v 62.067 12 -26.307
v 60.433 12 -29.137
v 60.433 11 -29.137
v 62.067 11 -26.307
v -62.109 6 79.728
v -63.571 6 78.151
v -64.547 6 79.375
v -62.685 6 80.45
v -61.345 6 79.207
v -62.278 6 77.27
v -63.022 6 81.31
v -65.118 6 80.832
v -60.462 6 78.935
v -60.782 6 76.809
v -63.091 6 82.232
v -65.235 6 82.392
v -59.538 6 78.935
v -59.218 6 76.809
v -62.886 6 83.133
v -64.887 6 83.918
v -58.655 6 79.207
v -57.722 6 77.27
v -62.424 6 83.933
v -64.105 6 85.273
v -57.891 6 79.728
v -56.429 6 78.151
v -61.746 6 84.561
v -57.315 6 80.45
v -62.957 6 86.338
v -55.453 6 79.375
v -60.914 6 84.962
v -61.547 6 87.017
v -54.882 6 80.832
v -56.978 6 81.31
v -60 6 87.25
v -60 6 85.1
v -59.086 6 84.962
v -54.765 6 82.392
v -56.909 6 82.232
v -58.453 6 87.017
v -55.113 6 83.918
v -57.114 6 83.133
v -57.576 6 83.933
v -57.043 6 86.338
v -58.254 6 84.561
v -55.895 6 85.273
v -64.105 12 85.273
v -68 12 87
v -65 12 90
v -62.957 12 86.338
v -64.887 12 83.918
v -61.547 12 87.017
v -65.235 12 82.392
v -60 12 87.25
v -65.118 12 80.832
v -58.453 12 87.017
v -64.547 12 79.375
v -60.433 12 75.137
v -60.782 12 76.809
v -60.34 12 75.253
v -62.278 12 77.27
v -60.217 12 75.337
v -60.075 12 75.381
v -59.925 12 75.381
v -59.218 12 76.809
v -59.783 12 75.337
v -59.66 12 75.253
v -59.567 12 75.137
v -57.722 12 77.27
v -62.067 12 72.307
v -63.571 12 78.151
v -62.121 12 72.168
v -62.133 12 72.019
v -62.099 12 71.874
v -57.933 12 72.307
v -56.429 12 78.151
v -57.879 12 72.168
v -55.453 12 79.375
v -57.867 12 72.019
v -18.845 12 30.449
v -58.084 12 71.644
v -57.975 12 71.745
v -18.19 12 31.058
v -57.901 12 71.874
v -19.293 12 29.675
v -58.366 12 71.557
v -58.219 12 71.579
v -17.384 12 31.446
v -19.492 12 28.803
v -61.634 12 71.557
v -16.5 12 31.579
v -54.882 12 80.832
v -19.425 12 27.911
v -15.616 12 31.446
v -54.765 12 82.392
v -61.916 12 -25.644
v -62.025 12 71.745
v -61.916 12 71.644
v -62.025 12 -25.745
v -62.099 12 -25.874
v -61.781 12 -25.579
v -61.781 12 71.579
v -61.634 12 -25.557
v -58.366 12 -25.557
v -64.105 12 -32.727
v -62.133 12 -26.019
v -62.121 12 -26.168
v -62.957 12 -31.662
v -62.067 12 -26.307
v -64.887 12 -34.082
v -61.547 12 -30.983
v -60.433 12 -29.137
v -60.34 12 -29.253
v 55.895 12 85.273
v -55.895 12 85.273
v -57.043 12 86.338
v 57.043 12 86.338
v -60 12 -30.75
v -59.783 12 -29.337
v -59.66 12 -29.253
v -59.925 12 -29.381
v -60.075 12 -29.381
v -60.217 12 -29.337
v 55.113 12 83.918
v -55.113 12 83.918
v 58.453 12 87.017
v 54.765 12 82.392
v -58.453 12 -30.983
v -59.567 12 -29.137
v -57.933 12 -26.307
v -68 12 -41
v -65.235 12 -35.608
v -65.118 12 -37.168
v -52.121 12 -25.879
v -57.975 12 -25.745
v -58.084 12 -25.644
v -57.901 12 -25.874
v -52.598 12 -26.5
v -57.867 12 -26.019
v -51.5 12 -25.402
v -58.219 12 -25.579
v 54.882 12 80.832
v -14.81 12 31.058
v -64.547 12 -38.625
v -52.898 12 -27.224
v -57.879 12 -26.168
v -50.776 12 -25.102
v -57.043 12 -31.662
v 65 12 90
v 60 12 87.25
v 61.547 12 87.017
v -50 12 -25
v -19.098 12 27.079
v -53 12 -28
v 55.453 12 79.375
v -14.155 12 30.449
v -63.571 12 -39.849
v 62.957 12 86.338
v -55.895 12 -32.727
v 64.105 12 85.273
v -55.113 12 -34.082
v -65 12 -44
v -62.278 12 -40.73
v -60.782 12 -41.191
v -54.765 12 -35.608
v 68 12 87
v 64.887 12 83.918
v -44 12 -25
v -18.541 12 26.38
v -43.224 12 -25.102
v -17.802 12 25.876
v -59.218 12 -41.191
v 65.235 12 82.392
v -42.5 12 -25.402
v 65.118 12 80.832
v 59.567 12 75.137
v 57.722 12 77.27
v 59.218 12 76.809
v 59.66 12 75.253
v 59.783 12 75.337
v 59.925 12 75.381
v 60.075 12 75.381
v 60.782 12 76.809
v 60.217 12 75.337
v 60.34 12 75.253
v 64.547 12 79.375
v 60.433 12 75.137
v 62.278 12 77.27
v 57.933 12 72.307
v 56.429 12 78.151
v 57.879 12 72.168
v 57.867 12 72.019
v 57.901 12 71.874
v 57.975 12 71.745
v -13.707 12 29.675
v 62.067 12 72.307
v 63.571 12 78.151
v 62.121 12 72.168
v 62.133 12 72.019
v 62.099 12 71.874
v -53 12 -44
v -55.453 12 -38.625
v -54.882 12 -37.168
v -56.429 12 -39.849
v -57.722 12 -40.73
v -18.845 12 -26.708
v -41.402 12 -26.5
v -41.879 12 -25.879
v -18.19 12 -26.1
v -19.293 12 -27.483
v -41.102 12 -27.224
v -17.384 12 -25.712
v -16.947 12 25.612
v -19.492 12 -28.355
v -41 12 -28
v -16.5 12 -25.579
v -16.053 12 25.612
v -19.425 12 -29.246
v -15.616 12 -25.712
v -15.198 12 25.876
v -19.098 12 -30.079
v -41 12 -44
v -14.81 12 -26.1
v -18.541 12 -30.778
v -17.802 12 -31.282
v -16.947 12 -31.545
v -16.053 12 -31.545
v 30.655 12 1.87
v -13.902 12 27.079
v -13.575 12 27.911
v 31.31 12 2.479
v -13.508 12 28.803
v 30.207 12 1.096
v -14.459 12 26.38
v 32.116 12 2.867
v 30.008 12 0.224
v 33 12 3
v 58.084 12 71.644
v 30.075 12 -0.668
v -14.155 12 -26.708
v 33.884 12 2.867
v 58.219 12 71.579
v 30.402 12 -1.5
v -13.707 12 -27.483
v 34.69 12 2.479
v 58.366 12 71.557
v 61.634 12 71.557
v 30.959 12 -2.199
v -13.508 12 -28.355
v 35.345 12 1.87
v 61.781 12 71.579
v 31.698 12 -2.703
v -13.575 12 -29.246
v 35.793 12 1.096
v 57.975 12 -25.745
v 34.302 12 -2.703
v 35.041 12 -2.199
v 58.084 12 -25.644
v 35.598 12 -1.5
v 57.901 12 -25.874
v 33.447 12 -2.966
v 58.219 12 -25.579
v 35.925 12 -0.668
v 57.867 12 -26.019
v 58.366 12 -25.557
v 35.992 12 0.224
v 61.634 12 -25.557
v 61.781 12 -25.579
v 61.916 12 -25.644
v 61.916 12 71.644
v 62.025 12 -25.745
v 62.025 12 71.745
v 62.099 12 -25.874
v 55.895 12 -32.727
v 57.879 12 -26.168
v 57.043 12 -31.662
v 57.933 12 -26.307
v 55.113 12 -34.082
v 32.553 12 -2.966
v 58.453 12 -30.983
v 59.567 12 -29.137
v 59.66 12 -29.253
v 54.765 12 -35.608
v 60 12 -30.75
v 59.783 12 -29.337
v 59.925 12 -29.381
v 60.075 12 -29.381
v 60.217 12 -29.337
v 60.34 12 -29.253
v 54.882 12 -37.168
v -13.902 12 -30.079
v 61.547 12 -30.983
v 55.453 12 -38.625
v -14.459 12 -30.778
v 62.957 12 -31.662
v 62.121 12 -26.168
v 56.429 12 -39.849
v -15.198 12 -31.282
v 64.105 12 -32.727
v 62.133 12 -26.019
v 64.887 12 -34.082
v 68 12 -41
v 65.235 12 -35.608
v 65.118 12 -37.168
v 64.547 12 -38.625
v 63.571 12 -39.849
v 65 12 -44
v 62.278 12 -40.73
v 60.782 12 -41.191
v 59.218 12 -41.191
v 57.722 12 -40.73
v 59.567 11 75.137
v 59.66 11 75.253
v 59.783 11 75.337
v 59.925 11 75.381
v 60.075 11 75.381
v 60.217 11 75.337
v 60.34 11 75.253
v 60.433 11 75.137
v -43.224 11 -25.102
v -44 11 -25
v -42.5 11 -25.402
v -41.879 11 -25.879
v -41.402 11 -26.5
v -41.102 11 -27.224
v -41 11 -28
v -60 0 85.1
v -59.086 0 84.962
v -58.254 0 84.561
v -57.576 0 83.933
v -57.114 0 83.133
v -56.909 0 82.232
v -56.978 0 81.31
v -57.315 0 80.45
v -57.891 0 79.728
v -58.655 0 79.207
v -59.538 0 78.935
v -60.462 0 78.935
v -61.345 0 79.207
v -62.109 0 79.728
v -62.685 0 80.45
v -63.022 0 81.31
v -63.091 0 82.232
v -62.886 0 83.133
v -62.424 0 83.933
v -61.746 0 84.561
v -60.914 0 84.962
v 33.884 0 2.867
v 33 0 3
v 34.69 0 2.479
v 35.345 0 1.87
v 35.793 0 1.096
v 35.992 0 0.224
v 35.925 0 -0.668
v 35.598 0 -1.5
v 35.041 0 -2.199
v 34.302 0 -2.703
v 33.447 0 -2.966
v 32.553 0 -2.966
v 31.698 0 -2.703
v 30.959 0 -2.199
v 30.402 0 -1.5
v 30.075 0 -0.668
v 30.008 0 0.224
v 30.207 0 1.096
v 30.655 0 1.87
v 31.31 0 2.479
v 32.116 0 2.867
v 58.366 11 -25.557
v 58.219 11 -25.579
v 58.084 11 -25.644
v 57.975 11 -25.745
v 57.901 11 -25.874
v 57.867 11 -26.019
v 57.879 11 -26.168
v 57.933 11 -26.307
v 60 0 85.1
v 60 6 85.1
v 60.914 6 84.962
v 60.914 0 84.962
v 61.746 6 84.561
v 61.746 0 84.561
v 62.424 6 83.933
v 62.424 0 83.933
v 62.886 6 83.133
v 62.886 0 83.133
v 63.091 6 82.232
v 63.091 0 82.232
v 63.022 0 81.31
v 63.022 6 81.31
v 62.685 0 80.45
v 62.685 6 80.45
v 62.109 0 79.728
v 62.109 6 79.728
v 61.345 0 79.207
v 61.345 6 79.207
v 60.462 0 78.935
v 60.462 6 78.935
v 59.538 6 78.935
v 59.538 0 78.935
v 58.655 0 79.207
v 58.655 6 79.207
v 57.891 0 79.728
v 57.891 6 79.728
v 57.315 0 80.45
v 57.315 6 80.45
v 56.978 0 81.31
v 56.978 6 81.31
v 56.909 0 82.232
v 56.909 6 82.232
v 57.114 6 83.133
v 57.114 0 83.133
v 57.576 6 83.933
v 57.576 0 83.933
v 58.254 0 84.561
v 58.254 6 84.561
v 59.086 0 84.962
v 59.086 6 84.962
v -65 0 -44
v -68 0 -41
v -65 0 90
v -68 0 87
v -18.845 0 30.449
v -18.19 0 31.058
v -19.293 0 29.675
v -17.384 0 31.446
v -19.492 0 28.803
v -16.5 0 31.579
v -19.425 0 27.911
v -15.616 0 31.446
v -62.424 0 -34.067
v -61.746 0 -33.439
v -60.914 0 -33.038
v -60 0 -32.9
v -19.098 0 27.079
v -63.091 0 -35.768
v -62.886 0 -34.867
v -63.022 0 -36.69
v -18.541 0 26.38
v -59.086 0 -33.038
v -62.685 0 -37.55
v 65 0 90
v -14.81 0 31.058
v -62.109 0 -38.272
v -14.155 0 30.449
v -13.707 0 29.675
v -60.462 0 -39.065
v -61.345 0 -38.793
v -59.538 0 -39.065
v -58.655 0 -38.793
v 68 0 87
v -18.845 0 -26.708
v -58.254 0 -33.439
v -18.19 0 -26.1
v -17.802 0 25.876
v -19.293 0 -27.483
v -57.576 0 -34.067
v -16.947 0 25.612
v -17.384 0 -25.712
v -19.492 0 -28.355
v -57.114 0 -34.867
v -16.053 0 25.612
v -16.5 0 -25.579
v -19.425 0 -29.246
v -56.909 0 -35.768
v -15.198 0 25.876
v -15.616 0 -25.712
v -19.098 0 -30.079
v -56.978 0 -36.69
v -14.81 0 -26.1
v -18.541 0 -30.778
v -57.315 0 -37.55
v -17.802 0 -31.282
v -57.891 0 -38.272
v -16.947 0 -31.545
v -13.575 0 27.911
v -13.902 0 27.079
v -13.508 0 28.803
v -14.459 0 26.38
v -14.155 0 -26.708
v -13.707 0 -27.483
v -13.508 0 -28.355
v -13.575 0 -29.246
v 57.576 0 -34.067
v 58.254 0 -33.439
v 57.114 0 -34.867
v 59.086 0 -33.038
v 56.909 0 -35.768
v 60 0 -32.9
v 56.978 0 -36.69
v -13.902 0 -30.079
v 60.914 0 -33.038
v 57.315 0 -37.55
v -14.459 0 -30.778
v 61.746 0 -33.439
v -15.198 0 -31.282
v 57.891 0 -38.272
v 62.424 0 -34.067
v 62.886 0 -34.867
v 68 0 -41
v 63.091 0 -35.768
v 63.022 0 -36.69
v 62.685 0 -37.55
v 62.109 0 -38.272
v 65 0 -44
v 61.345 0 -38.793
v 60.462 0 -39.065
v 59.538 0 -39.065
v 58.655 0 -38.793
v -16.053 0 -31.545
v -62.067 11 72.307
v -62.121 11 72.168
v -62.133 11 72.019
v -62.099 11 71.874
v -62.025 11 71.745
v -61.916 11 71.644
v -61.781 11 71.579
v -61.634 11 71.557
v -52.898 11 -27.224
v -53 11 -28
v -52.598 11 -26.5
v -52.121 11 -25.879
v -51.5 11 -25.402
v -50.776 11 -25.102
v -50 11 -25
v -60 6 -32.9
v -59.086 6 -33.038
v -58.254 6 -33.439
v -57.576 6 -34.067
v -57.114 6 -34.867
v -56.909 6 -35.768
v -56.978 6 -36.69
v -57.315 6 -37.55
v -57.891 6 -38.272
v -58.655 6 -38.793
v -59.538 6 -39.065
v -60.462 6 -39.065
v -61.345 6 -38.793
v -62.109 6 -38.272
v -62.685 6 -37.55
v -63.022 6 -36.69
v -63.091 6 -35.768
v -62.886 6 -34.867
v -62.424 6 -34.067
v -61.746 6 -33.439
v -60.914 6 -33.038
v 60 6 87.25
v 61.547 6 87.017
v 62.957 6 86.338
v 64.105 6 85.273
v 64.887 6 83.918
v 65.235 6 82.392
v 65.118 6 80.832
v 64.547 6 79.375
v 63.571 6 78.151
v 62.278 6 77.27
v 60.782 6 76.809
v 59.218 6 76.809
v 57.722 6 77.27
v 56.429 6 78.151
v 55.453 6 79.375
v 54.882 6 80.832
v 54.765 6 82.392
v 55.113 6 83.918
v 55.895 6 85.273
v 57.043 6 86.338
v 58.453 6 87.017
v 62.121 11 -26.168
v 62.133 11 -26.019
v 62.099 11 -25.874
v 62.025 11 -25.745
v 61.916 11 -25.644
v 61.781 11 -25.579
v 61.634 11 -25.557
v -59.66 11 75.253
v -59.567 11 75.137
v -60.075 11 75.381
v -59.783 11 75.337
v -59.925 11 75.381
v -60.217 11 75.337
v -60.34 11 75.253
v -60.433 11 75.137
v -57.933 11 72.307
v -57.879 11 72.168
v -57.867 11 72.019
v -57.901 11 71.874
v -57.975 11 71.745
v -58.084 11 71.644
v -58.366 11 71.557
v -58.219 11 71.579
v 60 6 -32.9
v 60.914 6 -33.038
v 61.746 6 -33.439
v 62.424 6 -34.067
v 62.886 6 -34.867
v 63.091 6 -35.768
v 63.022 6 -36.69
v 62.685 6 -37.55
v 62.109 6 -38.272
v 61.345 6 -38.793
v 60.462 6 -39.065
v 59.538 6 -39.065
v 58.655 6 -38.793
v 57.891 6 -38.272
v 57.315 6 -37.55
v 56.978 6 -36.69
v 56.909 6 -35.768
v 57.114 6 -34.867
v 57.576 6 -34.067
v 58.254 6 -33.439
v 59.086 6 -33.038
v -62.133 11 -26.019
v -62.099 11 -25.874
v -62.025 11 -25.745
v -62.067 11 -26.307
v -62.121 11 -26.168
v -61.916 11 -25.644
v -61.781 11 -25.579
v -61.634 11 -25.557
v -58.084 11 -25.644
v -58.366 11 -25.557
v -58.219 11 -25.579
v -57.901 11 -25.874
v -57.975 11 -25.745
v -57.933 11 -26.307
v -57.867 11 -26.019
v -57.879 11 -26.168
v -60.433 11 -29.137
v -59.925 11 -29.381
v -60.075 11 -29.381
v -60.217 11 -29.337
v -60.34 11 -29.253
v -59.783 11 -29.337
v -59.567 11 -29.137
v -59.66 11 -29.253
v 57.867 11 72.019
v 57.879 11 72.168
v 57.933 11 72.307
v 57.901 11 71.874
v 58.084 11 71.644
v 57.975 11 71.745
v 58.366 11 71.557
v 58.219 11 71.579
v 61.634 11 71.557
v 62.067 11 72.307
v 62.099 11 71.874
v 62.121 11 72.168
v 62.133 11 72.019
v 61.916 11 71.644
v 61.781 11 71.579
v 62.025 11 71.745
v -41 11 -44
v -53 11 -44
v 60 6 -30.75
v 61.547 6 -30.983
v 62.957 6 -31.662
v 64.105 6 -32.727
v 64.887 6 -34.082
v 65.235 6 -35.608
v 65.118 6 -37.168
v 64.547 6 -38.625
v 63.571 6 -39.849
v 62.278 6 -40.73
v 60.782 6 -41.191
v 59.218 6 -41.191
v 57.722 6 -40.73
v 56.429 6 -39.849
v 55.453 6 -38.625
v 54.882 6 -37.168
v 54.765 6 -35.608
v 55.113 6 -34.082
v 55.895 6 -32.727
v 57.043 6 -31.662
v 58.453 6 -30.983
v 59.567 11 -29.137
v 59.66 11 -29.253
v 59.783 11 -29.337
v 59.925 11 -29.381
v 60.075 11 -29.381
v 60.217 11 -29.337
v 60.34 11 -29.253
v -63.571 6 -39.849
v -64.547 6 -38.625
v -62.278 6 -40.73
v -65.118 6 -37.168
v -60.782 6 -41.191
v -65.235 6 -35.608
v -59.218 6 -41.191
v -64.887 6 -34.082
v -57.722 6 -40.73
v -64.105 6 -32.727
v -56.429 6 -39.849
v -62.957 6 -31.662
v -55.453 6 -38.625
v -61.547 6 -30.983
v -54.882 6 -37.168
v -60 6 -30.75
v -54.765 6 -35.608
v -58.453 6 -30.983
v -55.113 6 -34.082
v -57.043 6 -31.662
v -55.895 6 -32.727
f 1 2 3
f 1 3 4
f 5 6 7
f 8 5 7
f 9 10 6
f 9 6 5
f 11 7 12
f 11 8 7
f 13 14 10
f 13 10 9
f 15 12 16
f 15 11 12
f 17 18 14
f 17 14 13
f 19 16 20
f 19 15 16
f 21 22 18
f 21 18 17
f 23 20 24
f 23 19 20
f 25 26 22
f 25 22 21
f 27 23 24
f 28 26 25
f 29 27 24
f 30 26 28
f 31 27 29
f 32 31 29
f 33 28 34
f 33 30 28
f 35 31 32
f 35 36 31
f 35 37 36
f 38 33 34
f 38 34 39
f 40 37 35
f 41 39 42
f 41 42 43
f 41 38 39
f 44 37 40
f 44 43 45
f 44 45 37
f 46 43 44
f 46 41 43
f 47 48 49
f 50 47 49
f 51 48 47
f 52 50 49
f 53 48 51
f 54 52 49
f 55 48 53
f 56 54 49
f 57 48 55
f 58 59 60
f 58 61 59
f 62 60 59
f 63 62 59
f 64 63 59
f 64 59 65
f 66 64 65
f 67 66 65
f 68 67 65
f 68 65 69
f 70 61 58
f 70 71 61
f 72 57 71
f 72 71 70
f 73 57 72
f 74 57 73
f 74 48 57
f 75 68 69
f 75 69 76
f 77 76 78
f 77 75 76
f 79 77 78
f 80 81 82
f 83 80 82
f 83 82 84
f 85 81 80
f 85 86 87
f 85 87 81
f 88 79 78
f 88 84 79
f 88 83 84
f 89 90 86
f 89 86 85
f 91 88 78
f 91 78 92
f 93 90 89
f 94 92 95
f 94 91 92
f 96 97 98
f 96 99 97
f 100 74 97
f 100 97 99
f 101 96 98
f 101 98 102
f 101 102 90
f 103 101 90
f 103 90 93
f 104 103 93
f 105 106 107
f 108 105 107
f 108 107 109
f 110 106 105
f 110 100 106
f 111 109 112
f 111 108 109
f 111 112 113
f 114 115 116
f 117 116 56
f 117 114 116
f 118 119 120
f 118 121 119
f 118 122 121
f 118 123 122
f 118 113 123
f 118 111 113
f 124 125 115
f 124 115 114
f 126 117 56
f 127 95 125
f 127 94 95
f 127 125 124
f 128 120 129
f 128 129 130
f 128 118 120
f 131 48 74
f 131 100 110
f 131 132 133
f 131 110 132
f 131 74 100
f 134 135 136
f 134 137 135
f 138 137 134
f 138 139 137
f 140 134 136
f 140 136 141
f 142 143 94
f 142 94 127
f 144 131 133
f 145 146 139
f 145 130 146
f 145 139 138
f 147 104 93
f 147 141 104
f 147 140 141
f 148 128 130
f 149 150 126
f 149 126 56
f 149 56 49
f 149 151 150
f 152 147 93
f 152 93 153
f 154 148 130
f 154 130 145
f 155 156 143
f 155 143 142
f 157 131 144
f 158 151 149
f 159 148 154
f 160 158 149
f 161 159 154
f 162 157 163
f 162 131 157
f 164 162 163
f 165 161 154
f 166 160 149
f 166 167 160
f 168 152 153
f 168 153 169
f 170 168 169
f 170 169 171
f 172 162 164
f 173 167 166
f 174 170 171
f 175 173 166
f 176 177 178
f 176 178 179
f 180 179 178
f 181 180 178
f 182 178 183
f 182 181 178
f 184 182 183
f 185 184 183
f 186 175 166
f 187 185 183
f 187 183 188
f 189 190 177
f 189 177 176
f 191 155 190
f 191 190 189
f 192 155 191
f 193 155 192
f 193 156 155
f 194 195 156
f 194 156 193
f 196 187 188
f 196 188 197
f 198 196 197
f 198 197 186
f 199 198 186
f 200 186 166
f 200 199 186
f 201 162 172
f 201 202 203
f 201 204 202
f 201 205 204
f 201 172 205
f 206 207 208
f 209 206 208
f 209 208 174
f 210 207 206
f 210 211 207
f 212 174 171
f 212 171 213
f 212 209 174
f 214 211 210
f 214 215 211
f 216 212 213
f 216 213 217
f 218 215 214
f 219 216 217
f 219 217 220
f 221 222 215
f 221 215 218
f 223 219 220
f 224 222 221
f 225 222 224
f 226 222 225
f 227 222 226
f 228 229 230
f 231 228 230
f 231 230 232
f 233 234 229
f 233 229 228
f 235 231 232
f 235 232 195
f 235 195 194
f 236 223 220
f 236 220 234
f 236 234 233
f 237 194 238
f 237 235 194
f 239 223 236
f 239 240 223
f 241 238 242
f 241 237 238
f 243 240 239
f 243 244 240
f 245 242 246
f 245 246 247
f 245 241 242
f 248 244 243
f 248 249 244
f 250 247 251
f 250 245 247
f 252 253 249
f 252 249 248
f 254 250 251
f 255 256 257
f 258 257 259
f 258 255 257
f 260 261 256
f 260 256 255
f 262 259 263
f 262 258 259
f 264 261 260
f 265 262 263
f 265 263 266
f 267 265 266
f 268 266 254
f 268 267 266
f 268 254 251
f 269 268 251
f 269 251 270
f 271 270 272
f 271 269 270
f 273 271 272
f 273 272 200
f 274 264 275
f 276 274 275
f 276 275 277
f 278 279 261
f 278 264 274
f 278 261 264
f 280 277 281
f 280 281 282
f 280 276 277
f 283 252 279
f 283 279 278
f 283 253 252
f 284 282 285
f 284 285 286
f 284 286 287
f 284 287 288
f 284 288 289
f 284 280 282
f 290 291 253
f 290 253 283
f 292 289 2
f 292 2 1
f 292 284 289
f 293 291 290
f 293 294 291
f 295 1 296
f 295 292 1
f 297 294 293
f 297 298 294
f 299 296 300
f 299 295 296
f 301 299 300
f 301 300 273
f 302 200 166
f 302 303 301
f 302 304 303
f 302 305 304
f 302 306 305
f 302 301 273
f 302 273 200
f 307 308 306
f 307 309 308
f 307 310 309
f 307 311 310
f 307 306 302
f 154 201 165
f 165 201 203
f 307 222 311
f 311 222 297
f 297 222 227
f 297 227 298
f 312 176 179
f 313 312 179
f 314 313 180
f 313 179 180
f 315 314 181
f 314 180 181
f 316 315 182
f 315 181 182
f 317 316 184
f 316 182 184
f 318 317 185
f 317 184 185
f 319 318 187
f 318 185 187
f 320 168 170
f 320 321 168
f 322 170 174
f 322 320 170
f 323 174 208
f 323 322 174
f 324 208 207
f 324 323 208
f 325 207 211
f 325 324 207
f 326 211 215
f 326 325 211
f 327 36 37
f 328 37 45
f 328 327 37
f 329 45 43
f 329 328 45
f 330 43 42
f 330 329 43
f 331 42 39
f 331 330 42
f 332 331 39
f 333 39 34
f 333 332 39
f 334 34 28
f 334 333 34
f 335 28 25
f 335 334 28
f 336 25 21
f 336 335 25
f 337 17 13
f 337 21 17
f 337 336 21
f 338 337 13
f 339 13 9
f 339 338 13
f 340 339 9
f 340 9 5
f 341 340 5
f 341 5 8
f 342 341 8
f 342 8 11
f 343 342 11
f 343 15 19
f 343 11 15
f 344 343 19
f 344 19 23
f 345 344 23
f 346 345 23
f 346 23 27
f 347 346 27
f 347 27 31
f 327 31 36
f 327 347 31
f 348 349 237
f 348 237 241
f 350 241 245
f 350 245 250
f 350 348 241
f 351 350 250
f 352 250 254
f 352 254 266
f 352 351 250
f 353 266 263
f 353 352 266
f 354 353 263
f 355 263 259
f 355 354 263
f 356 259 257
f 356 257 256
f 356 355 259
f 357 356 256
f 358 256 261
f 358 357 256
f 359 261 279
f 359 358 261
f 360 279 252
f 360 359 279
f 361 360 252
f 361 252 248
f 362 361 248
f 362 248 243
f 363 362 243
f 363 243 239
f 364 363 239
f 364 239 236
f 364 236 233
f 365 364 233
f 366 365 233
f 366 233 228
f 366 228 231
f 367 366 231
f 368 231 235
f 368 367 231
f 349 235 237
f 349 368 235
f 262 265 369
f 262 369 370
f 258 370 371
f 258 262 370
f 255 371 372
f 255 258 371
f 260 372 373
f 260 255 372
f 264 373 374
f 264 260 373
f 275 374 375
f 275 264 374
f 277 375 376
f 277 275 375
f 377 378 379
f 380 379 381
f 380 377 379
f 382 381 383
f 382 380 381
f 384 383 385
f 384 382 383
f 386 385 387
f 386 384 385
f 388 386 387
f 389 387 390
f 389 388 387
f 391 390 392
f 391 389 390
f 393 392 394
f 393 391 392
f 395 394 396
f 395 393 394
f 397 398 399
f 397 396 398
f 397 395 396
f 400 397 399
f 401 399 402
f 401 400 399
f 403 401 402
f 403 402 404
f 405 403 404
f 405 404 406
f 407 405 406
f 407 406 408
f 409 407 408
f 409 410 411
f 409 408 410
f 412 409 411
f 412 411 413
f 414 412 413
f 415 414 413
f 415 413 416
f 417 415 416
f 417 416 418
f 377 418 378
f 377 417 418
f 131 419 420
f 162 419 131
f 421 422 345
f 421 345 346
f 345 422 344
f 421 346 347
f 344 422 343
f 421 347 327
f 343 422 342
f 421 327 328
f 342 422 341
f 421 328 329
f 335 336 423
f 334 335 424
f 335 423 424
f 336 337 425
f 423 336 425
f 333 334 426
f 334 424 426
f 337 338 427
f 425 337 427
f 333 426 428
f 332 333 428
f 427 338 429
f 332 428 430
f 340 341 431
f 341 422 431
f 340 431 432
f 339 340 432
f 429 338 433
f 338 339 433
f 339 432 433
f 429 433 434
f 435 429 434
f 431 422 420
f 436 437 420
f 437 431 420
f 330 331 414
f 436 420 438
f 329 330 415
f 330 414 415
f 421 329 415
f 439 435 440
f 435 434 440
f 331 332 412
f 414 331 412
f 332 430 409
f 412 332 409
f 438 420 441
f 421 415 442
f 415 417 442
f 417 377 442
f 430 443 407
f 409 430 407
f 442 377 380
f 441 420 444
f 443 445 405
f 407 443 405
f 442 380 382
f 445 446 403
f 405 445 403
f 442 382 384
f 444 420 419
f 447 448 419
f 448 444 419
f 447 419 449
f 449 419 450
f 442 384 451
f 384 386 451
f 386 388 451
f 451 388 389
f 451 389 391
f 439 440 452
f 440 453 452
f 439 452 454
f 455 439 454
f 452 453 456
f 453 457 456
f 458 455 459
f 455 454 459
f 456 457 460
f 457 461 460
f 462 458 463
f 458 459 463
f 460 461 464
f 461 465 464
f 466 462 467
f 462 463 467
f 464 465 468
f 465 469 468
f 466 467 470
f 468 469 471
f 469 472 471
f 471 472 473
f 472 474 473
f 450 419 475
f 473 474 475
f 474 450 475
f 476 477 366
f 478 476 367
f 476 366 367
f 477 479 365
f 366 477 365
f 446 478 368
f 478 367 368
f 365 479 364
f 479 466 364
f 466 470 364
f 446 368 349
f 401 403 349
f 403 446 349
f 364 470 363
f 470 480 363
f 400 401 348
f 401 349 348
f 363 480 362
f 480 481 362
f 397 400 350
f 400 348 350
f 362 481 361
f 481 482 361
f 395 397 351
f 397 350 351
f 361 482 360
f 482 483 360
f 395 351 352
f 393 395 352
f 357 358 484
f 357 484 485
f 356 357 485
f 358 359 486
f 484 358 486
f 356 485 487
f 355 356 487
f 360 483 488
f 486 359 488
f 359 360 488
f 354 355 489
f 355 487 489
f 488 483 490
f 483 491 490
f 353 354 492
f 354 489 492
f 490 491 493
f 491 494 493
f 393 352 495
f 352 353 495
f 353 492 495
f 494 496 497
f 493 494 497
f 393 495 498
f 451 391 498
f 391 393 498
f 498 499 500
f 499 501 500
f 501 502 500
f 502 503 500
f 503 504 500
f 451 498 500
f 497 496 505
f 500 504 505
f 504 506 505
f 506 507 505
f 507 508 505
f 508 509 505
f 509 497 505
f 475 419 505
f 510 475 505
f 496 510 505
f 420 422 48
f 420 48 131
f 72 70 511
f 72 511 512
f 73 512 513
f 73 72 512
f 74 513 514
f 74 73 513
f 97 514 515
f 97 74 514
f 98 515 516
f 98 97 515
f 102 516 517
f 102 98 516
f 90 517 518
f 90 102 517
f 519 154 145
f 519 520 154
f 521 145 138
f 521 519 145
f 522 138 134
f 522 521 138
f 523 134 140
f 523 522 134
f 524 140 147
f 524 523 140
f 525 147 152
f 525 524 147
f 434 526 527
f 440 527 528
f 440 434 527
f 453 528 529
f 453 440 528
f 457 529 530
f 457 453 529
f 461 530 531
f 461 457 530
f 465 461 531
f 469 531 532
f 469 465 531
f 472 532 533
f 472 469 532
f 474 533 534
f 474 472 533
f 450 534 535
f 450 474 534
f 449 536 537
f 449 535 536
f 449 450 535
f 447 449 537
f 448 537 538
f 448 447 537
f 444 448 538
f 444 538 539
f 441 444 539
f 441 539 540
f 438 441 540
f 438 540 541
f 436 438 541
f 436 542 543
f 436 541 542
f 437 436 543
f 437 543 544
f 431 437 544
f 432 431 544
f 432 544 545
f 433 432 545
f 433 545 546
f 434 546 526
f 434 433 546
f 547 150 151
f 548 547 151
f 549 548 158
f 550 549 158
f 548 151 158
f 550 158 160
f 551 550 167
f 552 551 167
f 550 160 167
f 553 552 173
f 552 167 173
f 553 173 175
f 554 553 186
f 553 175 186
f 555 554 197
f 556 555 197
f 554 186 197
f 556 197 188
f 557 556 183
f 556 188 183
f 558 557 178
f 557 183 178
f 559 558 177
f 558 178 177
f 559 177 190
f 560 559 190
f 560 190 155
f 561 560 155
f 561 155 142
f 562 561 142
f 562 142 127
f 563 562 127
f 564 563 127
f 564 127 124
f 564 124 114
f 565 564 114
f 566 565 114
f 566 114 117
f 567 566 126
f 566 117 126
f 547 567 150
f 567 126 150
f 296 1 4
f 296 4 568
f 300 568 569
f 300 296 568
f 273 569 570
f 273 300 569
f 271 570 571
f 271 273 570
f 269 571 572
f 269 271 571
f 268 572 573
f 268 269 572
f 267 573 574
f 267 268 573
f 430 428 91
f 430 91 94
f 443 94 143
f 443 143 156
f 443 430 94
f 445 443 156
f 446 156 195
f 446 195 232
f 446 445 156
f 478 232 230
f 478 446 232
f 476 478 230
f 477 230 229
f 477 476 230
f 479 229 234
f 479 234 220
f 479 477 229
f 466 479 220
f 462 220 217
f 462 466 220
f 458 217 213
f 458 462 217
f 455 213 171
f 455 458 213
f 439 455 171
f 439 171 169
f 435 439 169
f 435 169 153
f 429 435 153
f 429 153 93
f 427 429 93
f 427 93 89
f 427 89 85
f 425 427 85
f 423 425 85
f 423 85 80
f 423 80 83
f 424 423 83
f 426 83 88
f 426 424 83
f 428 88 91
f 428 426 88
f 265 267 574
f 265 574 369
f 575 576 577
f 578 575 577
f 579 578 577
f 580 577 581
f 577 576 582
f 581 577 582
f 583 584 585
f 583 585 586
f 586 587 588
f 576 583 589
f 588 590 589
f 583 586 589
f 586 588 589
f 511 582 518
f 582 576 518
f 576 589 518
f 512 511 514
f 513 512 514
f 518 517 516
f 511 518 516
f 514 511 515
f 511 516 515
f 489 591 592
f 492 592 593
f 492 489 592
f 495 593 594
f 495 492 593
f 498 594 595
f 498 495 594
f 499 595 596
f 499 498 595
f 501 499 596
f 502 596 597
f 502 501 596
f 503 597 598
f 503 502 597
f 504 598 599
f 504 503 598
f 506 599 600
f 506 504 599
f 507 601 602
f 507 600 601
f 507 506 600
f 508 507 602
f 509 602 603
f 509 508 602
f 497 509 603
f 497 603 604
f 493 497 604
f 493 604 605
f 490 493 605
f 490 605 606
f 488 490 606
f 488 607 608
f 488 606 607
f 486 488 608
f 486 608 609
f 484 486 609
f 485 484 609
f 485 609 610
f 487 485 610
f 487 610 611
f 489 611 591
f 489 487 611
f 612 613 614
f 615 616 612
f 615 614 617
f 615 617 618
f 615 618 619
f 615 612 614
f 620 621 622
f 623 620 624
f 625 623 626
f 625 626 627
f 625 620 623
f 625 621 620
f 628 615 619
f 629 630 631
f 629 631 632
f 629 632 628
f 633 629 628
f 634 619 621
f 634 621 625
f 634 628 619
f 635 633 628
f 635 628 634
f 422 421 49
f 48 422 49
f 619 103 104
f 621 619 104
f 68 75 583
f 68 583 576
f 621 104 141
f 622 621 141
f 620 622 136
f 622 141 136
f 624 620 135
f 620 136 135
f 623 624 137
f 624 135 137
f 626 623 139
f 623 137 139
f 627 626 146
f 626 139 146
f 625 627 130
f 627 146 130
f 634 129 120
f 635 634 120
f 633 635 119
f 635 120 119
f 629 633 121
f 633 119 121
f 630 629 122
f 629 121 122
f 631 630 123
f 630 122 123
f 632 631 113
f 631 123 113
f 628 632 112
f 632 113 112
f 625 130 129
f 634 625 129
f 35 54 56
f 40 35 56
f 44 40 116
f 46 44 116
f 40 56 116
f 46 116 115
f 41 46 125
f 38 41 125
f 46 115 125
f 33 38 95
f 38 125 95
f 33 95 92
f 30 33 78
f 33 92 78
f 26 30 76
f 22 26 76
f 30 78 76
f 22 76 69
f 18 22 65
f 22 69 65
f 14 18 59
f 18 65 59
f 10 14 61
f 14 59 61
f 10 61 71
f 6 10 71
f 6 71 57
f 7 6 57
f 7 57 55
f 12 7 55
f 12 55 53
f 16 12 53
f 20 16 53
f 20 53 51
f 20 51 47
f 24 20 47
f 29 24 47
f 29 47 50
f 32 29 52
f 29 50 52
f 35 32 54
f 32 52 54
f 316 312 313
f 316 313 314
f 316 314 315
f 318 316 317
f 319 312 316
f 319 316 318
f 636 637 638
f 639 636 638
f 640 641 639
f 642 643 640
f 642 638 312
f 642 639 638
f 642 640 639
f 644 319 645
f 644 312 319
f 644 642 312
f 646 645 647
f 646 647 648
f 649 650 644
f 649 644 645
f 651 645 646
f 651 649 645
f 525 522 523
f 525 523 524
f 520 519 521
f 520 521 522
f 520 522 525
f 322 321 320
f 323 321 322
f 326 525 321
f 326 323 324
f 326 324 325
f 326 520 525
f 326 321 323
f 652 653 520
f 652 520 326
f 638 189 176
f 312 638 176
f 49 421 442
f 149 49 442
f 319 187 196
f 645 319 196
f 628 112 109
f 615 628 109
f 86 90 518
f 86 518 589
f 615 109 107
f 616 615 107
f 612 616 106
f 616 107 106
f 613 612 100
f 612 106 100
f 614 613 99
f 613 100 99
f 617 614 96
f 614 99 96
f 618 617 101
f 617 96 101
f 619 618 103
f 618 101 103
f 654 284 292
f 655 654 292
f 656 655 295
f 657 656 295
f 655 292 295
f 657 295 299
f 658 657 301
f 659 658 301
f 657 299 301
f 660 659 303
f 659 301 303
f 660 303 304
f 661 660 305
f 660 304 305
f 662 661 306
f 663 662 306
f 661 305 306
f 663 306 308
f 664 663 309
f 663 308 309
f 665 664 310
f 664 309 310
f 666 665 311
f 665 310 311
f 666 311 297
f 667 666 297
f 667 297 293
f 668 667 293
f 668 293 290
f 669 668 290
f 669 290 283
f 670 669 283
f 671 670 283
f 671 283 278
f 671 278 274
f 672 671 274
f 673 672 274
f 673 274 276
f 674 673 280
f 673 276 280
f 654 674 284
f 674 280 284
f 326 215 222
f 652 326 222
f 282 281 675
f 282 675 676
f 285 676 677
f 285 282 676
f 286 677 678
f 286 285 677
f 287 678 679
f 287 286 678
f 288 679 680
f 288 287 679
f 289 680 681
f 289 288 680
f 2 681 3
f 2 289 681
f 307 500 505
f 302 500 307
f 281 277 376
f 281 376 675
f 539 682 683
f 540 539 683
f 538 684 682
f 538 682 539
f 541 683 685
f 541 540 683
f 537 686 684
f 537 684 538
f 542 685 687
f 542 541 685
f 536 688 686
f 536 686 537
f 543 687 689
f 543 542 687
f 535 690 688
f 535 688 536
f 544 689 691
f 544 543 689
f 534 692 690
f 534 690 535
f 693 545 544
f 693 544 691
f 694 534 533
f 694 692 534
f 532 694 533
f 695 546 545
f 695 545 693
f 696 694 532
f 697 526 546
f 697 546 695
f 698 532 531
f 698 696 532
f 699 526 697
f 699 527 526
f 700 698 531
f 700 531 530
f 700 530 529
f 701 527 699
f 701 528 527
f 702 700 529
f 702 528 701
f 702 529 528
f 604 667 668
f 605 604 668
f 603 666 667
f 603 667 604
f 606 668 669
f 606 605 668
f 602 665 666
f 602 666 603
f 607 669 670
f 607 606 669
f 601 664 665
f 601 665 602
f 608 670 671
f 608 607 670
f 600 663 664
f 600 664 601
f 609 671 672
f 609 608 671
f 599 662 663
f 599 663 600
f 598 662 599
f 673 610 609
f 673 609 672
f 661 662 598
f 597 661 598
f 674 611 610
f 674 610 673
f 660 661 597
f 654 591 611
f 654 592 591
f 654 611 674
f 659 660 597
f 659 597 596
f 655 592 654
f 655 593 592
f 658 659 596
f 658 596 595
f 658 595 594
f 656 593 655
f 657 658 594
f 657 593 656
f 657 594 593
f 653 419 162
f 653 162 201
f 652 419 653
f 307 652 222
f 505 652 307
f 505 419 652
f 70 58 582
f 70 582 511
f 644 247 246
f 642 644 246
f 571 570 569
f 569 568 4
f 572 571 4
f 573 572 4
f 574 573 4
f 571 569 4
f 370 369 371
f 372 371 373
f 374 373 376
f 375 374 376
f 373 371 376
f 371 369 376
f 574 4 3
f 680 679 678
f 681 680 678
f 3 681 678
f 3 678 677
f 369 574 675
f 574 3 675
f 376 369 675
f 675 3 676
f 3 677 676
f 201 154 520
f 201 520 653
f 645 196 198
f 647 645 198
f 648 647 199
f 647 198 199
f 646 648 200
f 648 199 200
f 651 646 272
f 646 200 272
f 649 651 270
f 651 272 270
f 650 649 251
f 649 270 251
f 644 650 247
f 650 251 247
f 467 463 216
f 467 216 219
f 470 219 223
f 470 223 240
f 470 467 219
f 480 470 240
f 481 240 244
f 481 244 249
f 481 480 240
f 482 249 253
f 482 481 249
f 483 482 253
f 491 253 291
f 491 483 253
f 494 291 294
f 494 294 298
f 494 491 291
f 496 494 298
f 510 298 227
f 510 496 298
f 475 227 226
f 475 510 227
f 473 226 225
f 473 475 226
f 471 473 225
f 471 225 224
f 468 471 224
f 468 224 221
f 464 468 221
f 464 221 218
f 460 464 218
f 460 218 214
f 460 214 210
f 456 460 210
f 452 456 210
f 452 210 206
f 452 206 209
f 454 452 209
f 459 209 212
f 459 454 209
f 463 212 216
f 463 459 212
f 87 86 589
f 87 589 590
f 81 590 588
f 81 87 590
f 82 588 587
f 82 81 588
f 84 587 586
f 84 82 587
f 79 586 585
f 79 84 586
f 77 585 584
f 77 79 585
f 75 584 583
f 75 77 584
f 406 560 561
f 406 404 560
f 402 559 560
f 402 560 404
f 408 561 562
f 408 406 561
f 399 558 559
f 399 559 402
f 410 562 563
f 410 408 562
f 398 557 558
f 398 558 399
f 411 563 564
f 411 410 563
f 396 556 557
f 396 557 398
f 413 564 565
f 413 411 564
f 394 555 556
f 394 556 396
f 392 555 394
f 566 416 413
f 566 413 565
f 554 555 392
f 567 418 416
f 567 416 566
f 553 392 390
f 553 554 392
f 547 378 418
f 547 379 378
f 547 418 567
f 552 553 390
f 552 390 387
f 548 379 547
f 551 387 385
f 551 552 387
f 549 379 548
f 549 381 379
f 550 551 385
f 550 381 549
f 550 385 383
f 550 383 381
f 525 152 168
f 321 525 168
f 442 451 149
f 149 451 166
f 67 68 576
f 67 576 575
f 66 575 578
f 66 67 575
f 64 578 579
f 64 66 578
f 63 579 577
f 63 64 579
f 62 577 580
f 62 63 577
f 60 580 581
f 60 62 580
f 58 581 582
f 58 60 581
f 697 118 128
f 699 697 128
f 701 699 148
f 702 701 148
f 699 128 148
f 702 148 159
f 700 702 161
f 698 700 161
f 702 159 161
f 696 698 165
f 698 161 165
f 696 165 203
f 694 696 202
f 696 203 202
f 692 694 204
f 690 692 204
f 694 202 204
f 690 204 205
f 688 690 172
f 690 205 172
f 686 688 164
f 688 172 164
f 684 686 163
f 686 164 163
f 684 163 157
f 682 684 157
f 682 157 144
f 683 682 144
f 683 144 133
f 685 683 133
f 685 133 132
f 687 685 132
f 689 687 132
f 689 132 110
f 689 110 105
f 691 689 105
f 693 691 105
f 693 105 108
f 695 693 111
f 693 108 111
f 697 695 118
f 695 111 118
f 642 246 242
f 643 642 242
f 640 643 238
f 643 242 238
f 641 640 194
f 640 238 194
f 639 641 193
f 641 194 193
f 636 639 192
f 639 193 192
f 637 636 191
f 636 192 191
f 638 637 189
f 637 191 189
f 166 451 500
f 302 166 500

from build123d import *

# Parameters (mm, degrees)
SKETCH_2_W             = 136
SKETCH_2_H             = 134
SKETCH_2_R             = 3.1
SKETCH_2_R_2           = 3
EXTRUDE_1_DEPTH        = 12
SKETCH_3_R             = 5.25
CUT_EXTRUDE_1165_DEPTH = 6
SKETCH_4_W             = 12
SKETCH_4_H             = 20
CUT_EXTRUDE_2_DEPTH    = 1
CHAMFER_1_SIZE         = 3
FILLET_1_R             = 3


with BuildPart() as part:
    # ｽｹｯﾁ2 → ﾎﾞｽ - 押し出し1 (new body)
    with BuildSketch(Plane(origin=(0, 0, 0), x_dir=(1, 0, 0), z_dir=(0, 1, 0))):
        with Locations((0, -23)):
            Rectangle(SKETCH_2_W, SKETCH_2_H)
        with Locations(Location((-60, 36, 0), (0, 0, 270))):
            Circle(SKETCH_2_R, mode=Mode.SUBTRACT)
        with Locations(Location((60, 36, 0), (0, 0, 270))):
            Circle(SKETCH_2_R, mode=Mode.SUBTRACT)
        with Locations(Location((60, -82, 0), (0, 0, 270))):
            Circle(SKETCH_2_R, mode=Mode.SUBTRACT)
        with Locations(Location((-60, -82, 0), (0, 0, 270))):
            Circle(SKETCH_2_R, mode=Mode.SUBTRACT)
        with Locations(Location((-16.5, 28.578838325, 0), (0, 0, 270))):
            Circle(SKETCH_2_R_2, mode=Mode.SUBTRACT)
        with Locations(Location((-16.5, -28.578838325, 0), (0, 0, 270))):
            Circle(SKETCH_2_R_2, mode=Mode.SUBTRACT)
        with Locations(Location((33, 0, 0), (0, 0, 270))):
            Circle(SKETCH_2_R_2, mode=Mode.SUBTRACT)
    extrude(amount=EXTRUDE_1_DEPTH)

    # ｽｹｯﾁ3 → Cut-Extrude 1165 (cut)
    with BuildSketch(Plane(origin=(0, 12, 0), x_dir=(1, 0, 0), z_dir=(0, 1, 0))):
        with Locations(Location((-60, 36, 0), (0, 0, 270))):
            Circle(SKETCH_3_R)
        with Locations(Location((60, 36, 0), (0, 0, 270))):
            Circle(SKETCH_3_R)
        with Locations(Location((-60, -82, 0), (0, 0, 270))):
            Circle(SKETCH_3_R)
        with Locations(Location((60, -82, 0), (0, 0, 270))):
            Circle(SKETCH_3_R)
    extrude(amount=-CUT_EXTRUDE_1165_DEPTH, mode=Mode.SUBTRACT)

    # ｽｹｯﾁ4 → ｶｯﾄ - 押し出し2 (cut)
    with BuildSketch(Plane(origin=(0, 12, 0), x_dir=(1, 0, 0), z_dir=(0, 1, 0))):
        with BuildLine():
            Line((57.933012702, 26.306624327), (59.566987298, 29.136751346))
            ThreePointArc((59.566987298, 29.136751346), (60, 29.386751346), (60.433012702, 29.136751346))
            Line((60.433012702, 29.136751346), (62.066987298, 26.306624327))
            ThreePointArc((62.066987298, 26.306624327), (62.066987298, 25.806624327), (61.633974596, 25.556624327))
            Line((61.633974596, 25.556624327), (58.366025404, 25.556624327))
            ThreePointArc((58.366025404, 25.556624327), (57.933012702, 25.806624327), (57.933012702, 26.306624327))
        make_face()
        with BuildLine():
            Line((-60.433012702, 29.136751346), (-62.066987298, 26.306624327))
            ThreePointArc((-62.066987298, 26.306624327), (-62.066987298, 25.806624327), (-61.633974596, 25.556624327))
            Line((-61.633974596, 25.556624327), (-58.366025404, 25.556624327))
            ThreePointArc((-58.366025404, 25.556624327), (-57.933012702, 25.806624327), (-57.933012702, 26.306624327))
            Line((-57.933012702, 26.306624327), (-59.566987298, 29.136751346))
            ThreePointArc((-59.566987298, 29.136751346), (-60, 29.386751346), (-60.433012702, 29.136751346))
        make_face()
        with BuildLine():
            Line((60.433012702, -75.136751346), (62.066987298, -72.306624327))
            ThreePointArc((62.066987298, -72.306624327), (62.066987298, -71.806624327), (61.633974596, -71.556624327))
            Line((61.633974596, -71.556624327), (58.366025404, -71.556624327))
            ThreePointArc((58.366025404, -71.556624327), (57.933012702, -71.806624327), (57.933012702, -72.306624327))
            Line((57.933012702, -72.306624327), (59.566987298, -75.136751346))
            ThreePointArc((59.566987298, -75.136751346), (60, -75.386751346), (60.433012702, -75.136751346))
        make_face()
        with BuildLine():
            Line((-57.933012702, -72.306624327), (-59.566987298, -75.136751346))
            ThreePointArc((-59.566987298, -75.136751346), (-60, -75.386751346), (-60.433012702, -75.136751346))
            Line((-60.433012702, -75.136751346), (-62.066987298, -72.306624327))
            ThreePointArc((-62.066987298, -72.306624327), (-62.066987298, -71.806624327), (-61.633974596, -71.556624327))
            Line((-61.633974596, -71.556624327), (-58.366025404, -71.556624327))
            ThreePointArc((-58.366025404, -71.556624327), (-57.933012702, -71.806624327), (-57.933012702, -72.306624327))
        make_face()
        with Locations((-47, 35)):
            Rectangle(SKETCH_4_W, SKETCH_4_H)
    extrude(amount=-CUT_EXTRUDE_2_DEPTH, mode=Mode.SUBTRACT)

    # 面取り1
    chamfer_1_edges = [part.edges().sort_by_distance(p)[0] for p in [
        (-68, 6, -44),
        (68, 6, -44),
        (68, 6, 90),
        (-68, 6, 90),
    ]]
    chamfer(chamfer_1_edges, length=CHAMFER_1_SIZE)

    # ﾌｨﾚｯﾄ1
    fillet_1_edges = [part.edges().sort_by_distance(p)[0] for p in [
        (-53, 11.5, -25),
        (-41, 11.5, -25),
    ]]
    fillet(fillet_1_edges, radius=FILLET_1_R)


solid = part.part
